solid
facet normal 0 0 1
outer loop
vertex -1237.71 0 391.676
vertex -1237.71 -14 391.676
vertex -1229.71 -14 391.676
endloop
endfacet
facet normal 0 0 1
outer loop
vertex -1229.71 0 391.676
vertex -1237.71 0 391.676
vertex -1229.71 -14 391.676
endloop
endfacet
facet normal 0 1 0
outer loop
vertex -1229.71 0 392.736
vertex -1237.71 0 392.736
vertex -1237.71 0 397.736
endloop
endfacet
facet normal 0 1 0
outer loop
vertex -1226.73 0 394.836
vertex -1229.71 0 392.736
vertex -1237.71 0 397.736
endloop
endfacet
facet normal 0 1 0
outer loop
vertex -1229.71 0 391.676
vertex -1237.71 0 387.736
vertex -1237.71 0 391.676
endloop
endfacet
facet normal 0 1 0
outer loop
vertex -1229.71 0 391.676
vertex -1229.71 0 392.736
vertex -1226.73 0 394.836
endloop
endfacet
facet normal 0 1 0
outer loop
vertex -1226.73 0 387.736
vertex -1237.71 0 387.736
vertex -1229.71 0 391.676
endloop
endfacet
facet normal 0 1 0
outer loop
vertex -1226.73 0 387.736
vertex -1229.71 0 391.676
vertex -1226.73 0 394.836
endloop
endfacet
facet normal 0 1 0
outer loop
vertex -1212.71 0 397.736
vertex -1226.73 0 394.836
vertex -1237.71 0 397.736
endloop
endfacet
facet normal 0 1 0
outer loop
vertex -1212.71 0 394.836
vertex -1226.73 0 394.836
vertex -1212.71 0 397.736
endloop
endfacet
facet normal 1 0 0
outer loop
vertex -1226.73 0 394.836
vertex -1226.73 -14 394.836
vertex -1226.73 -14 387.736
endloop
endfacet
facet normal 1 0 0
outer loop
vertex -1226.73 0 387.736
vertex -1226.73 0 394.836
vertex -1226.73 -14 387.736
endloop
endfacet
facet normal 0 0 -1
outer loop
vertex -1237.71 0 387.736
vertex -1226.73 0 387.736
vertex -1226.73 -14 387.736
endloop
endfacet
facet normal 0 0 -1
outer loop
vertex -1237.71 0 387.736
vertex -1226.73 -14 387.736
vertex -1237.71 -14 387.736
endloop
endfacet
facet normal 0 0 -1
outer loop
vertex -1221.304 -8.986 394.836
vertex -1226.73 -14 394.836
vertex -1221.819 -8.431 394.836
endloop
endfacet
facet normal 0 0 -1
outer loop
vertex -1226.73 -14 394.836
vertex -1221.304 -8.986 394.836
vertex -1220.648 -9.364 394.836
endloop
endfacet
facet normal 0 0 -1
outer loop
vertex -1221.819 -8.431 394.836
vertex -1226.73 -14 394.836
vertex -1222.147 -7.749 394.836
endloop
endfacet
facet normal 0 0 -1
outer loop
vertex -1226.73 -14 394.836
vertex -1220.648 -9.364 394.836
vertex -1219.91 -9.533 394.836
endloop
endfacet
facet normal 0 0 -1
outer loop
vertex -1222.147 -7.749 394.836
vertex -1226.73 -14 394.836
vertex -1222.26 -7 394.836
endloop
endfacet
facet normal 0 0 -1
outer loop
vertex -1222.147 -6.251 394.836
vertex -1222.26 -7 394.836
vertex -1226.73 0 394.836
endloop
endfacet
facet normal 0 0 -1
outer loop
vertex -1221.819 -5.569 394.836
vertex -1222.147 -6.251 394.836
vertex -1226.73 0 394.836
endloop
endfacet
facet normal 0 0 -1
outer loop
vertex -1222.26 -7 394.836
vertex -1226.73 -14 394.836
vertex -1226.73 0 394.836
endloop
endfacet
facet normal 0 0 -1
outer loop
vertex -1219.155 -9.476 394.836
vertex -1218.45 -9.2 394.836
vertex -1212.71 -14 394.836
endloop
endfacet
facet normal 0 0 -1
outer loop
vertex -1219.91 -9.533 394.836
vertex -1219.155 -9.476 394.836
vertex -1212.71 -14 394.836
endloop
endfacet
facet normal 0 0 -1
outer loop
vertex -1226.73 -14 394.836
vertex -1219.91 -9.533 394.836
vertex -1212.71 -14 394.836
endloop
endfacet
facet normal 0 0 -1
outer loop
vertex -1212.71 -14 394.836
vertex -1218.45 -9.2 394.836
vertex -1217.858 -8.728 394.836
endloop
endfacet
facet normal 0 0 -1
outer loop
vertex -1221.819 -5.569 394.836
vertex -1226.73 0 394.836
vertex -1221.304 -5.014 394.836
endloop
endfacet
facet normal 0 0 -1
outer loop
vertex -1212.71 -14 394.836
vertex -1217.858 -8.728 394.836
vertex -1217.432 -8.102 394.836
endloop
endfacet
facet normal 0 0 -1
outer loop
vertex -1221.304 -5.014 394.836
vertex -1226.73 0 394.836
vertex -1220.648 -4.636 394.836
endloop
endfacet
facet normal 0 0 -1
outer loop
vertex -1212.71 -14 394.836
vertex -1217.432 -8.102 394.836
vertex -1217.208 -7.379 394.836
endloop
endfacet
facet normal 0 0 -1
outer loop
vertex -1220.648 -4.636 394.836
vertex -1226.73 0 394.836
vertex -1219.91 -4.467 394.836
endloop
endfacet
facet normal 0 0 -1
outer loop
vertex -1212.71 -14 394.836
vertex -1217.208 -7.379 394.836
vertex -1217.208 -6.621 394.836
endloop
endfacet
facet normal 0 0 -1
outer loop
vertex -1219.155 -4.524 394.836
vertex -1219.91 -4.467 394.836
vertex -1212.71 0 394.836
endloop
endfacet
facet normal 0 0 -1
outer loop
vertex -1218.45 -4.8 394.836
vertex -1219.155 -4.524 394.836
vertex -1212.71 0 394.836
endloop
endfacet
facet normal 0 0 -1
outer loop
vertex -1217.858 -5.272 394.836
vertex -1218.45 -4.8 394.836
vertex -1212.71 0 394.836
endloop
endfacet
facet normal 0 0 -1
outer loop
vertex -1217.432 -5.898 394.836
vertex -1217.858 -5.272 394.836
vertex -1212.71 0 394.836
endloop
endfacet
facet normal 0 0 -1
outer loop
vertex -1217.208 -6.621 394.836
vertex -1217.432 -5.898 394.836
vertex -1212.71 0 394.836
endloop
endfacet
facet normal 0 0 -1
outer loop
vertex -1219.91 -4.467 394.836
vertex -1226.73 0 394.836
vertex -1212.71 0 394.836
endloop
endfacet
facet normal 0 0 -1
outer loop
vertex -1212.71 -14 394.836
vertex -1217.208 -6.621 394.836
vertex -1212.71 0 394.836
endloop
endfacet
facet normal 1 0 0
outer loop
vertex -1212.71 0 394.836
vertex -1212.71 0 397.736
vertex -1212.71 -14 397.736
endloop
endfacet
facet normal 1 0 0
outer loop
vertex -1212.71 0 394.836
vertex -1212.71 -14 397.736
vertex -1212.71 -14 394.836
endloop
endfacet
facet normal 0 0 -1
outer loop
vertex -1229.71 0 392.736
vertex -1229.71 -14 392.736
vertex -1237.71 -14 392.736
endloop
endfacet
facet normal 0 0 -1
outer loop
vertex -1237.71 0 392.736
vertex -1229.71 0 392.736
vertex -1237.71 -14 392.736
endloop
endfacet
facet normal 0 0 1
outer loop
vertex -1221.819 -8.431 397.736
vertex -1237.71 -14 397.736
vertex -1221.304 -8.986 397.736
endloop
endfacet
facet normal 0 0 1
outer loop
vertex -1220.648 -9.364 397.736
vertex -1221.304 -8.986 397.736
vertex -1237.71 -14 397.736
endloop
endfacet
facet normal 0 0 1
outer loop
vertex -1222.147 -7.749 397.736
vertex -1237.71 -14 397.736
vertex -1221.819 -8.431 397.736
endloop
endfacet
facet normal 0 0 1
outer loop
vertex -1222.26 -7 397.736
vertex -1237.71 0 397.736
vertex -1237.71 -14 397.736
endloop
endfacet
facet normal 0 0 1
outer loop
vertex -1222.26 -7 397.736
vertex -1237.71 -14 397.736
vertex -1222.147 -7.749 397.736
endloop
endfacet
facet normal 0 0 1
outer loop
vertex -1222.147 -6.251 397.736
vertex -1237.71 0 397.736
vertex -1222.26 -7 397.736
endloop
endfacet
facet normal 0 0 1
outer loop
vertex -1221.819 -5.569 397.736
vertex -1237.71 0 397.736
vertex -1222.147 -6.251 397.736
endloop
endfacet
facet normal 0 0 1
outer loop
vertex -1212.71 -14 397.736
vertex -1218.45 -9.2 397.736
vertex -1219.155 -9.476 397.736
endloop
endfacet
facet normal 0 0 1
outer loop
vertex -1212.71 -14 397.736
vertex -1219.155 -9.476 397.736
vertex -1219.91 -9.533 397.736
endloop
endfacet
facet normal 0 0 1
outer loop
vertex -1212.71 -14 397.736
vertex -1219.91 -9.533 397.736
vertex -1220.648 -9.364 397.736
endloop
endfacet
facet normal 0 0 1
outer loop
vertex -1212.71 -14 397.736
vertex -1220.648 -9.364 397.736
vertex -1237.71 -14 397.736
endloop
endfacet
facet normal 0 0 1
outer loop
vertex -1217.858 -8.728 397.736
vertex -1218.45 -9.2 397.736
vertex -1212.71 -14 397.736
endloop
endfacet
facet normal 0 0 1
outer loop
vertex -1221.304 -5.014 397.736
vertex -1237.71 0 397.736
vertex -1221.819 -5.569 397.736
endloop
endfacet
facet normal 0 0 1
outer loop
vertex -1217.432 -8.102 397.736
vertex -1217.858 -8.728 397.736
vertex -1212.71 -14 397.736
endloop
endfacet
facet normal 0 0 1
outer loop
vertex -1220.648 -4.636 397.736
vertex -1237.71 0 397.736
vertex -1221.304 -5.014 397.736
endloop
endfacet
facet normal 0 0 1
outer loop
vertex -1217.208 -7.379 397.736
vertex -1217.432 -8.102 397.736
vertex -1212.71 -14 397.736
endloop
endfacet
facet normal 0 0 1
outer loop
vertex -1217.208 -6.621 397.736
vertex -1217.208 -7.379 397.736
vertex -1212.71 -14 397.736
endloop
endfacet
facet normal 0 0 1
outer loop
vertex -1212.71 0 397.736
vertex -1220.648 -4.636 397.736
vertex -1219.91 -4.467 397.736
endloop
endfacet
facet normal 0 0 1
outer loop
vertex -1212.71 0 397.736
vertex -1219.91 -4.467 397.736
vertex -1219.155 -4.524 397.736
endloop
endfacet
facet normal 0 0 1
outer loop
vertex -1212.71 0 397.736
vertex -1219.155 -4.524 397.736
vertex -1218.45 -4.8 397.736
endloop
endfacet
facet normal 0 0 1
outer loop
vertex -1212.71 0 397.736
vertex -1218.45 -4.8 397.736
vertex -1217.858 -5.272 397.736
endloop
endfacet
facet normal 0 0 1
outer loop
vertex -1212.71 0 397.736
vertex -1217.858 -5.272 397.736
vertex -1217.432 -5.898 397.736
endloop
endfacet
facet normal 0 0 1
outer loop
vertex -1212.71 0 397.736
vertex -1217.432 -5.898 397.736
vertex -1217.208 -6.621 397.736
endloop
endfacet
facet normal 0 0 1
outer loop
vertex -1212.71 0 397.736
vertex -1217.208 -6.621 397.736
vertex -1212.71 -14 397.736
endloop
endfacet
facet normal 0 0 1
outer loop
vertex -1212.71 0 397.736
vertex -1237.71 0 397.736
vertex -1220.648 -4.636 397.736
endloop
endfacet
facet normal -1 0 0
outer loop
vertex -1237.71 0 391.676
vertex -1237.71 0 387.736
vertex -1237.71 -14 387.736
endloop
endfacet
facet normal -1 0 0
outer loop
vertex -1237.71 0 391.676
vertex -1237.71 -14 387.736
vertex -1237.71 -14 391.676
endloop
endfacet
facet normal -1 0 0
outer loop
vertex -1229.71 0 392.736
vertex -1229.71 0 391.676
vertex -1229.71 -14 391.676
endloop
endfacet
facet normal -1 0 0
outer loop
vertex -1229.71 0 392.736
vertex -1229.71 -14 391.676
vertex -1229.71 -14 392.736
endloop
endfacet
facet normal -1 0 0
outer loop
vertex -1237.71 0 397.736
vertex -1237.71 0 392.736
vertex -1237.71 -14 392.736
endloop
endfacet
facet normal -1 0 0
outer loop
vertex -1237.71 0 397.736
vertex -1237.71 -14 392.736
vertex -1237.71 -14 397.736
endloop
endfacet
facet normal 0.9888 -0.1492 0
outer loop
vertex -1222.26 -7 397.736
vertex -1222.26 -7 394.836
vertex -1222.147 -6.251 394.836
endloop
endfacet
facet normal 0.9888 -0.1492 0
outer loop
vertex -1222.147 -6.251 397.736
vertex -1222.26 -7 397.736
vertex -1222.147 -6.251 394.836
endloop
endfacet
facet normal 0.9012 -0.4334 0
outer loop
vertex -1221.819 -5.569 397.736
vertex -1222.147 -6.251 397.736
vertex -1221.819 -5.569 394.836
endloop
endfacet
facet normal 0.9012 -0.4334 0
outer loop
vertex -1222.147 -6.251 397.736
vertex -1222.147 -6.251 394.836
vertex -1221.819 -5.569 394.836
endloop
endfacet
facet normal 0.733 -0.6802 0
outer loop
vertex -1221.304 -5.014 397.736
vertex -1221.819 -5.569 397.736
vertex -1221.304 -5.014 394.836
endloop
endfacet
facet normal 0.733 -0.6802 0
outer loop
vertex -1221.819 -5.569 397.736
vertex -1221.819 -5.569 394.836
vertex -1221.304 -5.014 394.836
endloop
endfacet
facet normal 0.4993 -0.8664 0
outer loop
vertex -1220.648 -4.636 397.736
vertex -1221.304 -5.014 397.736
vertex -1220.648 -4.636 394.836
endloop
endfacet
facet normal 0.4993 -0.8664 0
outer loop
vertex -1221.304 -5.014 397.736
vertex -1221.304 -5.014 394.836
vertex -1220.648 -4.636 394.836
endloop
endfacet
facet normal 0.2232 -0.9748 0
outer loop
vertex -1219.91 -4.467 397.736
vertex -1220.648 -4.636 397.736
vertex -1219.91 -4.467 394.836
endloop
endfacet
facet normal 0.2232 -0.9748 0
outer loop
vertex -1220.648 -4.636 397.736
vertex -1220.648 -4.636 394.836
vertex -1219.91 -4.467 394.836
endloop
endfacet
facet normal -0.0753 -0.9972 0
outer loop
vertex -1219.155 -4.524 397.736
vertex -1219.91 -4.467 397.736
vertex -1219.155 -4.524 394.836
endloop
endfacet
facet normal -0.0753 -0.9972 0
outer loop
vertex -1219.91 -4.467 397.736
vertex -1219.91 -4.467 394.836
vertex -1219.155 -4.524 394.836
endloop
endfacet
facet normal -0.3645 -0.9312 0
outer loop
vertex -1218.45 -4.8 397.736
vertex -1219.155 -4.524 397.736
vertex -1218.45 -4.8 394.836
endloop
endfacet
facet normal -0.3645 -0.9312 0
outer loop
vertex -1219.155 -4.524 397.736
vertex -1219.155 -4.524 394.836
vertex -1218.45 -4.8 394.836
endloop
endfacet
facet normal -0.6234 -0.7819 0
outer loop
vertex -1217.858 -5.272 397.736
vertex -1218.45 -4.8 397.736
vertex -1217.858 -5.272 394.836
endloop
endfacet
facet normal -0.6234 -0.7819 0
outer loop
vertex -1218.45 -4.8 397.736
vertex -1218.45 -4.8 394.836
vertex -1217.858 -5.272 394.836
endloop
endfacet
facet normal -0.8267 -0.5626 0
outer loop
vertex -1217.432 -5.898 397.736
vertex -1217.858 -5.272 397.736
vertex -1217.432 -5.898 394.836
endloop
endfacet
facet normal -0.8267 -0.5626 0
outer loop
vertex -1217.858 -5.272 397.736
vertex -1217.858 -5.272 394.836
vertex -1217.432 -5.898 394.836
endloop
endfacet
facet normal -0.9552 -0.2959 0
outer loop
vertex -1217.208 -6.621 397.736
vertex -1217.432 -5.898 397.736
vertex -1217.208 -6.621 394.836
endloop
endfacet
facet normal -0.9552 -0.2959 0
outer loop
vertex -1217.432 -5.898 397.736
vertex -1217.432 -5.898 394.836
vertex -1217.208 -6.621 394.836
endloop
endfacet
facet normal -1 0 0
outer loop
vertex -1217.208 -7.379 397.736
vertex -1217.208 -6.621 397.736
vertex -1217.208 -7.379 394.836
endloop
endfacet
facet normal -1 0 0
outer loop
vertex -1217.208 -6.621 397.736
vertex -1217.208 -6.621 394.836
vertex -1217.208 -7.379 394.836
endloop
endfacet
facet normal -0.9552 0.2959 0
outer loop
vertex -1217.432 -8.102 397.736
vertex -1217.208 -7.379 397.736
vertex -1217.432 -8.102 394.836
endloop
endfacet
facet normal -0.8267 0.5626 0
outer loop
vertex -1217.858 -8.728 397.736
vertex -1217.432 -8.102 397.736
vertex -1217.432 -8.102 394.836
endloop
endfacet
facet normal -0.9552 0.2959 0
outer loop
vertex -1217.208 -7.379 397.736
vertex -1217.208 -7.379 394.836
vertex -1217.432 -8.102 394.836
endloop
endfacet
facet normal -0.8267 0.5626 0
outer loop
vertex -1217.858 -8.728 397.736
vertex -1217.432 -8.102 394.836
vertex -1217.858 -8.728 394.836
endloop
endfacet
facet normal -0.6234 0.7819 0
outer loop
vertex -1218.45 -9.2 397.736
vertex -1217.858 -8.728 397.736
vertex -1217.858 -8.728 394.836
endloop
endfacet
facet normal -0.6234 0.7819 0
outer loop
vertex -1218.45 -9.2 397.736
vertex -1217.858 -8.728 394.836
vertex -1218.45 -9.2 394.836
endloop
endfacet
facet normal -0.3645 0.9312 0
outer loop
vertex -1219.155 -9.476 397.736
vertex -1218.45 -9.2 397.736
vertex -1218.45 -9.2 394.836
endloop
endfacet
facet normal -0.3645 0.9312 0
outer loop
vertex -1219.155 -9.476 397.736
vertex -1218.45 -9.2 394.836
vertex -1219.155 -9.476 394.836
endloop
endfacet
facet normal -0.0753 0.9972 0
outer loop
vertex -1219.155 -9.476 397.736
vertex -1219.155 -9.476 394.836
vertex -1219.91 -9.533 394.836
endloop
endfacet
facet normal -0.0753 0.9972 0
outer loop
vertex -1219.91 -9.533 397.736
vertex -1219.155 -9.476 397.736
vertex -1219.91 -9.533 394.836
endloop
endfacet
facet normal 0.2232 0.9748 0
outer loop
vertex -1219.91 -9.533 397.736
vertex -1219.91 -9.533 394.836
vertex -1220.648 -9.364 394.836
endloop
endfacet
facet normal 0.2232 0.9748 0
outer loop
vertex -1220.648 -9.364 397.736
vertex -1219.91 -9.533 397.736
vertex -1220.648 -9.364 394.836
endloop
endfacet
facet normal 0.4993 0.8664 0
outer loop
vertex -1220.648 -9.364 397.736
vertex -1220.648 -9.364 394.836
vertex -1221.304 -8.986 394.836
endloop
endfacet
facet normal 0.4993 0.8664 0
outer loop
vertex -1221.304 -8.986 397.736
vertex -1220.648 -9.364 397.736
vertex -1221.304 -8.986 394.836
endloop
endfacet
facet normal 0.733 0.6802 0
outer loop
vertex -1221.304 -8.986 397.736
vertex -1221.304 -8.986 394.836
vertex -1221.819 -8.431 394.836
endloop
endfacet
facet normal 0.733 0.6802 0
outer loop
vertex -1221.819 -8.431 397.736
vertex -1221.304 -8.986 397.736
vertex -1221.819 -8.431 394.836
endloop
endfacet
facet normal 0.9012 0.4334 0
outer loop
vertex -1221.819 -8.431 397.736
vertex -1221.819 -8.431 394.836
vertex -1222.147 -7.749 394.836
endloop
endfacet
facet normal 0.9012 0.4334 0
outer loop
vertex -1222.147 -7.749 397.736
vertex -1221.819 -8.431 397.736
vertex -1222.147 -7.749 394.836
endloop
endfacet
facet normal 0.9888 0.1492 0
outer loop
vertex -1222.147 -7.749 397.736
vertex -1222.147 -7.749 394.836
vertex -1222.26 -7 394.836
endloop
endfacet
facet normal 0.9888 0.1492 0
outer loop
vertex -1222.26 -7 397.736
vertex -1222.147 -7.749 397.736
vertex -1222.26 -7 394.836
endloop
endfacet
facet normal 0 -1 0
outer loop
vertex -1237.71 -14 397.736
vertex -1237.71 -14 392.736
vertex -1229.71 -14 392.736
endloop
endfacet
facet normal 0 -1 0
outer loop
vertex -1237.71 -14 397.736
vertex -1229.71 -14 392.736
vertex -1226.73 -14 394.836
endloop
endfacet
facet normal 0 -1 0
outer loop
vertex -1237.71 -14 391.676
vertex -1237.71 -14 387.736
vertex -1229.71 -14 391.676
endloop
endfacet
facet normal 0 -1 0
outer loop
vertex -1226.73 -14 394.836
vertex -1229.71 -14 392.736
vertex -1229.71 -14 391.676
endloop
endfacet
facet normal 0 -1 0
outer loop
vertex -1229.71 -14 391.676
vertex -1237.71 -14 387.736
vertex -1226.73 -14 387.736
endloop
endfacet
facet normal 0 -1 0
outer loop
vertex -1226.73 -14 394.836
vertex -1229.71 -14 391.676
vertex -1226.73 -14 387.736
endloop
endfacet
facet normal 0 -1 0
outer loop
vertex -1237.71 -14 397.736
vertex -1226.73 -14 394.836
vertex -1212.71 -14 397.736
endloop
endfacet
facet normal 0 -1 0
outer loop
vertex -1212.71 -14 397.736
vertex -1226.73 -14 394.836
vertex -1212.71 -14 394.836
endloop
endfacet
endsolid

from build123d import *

# Parameters (mm, degrees)
BOSS_EXTRUDE1_DEPTH = 14
SKETCH2_W           = 14.019698715
SKETCH2_H           = 7.099583751
CUT_EXTRUDE1_DEPTH  = 1301.121764584
SKETCH4_R           = 2.54
CUT_EXTRUDE2_DEPTH  = 1238.809657762


with BuildPart() as part:
    # Sketch1 → Boss-Extrude1 (new body)
    with BuildSketch(Plane(origin=(0, 0, 0), x_dir=(1, 0, 0), z_dir=(0, 1, 0))):
        Polygon((-1237.710121457, -392.736417727), (-1237.710121457, -397.736417727), (-1212.710121457, -397.736417727), (-1212.710121457, -387.736417727), (-1237.710121457, -387.736417727), (-1237.710121457, -391.676417727), (-1229.710121457, -391.676417727), (-1229.710121457, -392.736417727), align=None)
    extrude(amount=-BOSS_EXTRUDE1_DEPTH)

    # Sketch2 → Cut-Extrude1 (cut, through all)
    with BuildSketch(Plane(origin=(0, 0, 0), x_dir=(1, 0, 0), z_dir=(0, 1, 0))):
        with Locations((-1219.719970814, -391.286209602)):
            Rectangle(SKETCH2_W, SKETCH2_H)
    extrude(amount=-CUT_EXTRUDE1_DEPTH, mode=Mode.SUBTRACT)

    # Sketch4 → Cut-Extrude2 (cut, through all)
    with BuildSketch(Plane(origin=(0, 0, 394.836001478), x_dir=(-1, 0, 0), z_dir=(0, 0, -1))):
        with Locations((1219.719970815, -7)):
            Circle(SKETCH4_R)
    extrude(amount=-CUT_EXTRUDE2_DEPTH, mode=Mode.SUBTRACT)


solid = part.part
